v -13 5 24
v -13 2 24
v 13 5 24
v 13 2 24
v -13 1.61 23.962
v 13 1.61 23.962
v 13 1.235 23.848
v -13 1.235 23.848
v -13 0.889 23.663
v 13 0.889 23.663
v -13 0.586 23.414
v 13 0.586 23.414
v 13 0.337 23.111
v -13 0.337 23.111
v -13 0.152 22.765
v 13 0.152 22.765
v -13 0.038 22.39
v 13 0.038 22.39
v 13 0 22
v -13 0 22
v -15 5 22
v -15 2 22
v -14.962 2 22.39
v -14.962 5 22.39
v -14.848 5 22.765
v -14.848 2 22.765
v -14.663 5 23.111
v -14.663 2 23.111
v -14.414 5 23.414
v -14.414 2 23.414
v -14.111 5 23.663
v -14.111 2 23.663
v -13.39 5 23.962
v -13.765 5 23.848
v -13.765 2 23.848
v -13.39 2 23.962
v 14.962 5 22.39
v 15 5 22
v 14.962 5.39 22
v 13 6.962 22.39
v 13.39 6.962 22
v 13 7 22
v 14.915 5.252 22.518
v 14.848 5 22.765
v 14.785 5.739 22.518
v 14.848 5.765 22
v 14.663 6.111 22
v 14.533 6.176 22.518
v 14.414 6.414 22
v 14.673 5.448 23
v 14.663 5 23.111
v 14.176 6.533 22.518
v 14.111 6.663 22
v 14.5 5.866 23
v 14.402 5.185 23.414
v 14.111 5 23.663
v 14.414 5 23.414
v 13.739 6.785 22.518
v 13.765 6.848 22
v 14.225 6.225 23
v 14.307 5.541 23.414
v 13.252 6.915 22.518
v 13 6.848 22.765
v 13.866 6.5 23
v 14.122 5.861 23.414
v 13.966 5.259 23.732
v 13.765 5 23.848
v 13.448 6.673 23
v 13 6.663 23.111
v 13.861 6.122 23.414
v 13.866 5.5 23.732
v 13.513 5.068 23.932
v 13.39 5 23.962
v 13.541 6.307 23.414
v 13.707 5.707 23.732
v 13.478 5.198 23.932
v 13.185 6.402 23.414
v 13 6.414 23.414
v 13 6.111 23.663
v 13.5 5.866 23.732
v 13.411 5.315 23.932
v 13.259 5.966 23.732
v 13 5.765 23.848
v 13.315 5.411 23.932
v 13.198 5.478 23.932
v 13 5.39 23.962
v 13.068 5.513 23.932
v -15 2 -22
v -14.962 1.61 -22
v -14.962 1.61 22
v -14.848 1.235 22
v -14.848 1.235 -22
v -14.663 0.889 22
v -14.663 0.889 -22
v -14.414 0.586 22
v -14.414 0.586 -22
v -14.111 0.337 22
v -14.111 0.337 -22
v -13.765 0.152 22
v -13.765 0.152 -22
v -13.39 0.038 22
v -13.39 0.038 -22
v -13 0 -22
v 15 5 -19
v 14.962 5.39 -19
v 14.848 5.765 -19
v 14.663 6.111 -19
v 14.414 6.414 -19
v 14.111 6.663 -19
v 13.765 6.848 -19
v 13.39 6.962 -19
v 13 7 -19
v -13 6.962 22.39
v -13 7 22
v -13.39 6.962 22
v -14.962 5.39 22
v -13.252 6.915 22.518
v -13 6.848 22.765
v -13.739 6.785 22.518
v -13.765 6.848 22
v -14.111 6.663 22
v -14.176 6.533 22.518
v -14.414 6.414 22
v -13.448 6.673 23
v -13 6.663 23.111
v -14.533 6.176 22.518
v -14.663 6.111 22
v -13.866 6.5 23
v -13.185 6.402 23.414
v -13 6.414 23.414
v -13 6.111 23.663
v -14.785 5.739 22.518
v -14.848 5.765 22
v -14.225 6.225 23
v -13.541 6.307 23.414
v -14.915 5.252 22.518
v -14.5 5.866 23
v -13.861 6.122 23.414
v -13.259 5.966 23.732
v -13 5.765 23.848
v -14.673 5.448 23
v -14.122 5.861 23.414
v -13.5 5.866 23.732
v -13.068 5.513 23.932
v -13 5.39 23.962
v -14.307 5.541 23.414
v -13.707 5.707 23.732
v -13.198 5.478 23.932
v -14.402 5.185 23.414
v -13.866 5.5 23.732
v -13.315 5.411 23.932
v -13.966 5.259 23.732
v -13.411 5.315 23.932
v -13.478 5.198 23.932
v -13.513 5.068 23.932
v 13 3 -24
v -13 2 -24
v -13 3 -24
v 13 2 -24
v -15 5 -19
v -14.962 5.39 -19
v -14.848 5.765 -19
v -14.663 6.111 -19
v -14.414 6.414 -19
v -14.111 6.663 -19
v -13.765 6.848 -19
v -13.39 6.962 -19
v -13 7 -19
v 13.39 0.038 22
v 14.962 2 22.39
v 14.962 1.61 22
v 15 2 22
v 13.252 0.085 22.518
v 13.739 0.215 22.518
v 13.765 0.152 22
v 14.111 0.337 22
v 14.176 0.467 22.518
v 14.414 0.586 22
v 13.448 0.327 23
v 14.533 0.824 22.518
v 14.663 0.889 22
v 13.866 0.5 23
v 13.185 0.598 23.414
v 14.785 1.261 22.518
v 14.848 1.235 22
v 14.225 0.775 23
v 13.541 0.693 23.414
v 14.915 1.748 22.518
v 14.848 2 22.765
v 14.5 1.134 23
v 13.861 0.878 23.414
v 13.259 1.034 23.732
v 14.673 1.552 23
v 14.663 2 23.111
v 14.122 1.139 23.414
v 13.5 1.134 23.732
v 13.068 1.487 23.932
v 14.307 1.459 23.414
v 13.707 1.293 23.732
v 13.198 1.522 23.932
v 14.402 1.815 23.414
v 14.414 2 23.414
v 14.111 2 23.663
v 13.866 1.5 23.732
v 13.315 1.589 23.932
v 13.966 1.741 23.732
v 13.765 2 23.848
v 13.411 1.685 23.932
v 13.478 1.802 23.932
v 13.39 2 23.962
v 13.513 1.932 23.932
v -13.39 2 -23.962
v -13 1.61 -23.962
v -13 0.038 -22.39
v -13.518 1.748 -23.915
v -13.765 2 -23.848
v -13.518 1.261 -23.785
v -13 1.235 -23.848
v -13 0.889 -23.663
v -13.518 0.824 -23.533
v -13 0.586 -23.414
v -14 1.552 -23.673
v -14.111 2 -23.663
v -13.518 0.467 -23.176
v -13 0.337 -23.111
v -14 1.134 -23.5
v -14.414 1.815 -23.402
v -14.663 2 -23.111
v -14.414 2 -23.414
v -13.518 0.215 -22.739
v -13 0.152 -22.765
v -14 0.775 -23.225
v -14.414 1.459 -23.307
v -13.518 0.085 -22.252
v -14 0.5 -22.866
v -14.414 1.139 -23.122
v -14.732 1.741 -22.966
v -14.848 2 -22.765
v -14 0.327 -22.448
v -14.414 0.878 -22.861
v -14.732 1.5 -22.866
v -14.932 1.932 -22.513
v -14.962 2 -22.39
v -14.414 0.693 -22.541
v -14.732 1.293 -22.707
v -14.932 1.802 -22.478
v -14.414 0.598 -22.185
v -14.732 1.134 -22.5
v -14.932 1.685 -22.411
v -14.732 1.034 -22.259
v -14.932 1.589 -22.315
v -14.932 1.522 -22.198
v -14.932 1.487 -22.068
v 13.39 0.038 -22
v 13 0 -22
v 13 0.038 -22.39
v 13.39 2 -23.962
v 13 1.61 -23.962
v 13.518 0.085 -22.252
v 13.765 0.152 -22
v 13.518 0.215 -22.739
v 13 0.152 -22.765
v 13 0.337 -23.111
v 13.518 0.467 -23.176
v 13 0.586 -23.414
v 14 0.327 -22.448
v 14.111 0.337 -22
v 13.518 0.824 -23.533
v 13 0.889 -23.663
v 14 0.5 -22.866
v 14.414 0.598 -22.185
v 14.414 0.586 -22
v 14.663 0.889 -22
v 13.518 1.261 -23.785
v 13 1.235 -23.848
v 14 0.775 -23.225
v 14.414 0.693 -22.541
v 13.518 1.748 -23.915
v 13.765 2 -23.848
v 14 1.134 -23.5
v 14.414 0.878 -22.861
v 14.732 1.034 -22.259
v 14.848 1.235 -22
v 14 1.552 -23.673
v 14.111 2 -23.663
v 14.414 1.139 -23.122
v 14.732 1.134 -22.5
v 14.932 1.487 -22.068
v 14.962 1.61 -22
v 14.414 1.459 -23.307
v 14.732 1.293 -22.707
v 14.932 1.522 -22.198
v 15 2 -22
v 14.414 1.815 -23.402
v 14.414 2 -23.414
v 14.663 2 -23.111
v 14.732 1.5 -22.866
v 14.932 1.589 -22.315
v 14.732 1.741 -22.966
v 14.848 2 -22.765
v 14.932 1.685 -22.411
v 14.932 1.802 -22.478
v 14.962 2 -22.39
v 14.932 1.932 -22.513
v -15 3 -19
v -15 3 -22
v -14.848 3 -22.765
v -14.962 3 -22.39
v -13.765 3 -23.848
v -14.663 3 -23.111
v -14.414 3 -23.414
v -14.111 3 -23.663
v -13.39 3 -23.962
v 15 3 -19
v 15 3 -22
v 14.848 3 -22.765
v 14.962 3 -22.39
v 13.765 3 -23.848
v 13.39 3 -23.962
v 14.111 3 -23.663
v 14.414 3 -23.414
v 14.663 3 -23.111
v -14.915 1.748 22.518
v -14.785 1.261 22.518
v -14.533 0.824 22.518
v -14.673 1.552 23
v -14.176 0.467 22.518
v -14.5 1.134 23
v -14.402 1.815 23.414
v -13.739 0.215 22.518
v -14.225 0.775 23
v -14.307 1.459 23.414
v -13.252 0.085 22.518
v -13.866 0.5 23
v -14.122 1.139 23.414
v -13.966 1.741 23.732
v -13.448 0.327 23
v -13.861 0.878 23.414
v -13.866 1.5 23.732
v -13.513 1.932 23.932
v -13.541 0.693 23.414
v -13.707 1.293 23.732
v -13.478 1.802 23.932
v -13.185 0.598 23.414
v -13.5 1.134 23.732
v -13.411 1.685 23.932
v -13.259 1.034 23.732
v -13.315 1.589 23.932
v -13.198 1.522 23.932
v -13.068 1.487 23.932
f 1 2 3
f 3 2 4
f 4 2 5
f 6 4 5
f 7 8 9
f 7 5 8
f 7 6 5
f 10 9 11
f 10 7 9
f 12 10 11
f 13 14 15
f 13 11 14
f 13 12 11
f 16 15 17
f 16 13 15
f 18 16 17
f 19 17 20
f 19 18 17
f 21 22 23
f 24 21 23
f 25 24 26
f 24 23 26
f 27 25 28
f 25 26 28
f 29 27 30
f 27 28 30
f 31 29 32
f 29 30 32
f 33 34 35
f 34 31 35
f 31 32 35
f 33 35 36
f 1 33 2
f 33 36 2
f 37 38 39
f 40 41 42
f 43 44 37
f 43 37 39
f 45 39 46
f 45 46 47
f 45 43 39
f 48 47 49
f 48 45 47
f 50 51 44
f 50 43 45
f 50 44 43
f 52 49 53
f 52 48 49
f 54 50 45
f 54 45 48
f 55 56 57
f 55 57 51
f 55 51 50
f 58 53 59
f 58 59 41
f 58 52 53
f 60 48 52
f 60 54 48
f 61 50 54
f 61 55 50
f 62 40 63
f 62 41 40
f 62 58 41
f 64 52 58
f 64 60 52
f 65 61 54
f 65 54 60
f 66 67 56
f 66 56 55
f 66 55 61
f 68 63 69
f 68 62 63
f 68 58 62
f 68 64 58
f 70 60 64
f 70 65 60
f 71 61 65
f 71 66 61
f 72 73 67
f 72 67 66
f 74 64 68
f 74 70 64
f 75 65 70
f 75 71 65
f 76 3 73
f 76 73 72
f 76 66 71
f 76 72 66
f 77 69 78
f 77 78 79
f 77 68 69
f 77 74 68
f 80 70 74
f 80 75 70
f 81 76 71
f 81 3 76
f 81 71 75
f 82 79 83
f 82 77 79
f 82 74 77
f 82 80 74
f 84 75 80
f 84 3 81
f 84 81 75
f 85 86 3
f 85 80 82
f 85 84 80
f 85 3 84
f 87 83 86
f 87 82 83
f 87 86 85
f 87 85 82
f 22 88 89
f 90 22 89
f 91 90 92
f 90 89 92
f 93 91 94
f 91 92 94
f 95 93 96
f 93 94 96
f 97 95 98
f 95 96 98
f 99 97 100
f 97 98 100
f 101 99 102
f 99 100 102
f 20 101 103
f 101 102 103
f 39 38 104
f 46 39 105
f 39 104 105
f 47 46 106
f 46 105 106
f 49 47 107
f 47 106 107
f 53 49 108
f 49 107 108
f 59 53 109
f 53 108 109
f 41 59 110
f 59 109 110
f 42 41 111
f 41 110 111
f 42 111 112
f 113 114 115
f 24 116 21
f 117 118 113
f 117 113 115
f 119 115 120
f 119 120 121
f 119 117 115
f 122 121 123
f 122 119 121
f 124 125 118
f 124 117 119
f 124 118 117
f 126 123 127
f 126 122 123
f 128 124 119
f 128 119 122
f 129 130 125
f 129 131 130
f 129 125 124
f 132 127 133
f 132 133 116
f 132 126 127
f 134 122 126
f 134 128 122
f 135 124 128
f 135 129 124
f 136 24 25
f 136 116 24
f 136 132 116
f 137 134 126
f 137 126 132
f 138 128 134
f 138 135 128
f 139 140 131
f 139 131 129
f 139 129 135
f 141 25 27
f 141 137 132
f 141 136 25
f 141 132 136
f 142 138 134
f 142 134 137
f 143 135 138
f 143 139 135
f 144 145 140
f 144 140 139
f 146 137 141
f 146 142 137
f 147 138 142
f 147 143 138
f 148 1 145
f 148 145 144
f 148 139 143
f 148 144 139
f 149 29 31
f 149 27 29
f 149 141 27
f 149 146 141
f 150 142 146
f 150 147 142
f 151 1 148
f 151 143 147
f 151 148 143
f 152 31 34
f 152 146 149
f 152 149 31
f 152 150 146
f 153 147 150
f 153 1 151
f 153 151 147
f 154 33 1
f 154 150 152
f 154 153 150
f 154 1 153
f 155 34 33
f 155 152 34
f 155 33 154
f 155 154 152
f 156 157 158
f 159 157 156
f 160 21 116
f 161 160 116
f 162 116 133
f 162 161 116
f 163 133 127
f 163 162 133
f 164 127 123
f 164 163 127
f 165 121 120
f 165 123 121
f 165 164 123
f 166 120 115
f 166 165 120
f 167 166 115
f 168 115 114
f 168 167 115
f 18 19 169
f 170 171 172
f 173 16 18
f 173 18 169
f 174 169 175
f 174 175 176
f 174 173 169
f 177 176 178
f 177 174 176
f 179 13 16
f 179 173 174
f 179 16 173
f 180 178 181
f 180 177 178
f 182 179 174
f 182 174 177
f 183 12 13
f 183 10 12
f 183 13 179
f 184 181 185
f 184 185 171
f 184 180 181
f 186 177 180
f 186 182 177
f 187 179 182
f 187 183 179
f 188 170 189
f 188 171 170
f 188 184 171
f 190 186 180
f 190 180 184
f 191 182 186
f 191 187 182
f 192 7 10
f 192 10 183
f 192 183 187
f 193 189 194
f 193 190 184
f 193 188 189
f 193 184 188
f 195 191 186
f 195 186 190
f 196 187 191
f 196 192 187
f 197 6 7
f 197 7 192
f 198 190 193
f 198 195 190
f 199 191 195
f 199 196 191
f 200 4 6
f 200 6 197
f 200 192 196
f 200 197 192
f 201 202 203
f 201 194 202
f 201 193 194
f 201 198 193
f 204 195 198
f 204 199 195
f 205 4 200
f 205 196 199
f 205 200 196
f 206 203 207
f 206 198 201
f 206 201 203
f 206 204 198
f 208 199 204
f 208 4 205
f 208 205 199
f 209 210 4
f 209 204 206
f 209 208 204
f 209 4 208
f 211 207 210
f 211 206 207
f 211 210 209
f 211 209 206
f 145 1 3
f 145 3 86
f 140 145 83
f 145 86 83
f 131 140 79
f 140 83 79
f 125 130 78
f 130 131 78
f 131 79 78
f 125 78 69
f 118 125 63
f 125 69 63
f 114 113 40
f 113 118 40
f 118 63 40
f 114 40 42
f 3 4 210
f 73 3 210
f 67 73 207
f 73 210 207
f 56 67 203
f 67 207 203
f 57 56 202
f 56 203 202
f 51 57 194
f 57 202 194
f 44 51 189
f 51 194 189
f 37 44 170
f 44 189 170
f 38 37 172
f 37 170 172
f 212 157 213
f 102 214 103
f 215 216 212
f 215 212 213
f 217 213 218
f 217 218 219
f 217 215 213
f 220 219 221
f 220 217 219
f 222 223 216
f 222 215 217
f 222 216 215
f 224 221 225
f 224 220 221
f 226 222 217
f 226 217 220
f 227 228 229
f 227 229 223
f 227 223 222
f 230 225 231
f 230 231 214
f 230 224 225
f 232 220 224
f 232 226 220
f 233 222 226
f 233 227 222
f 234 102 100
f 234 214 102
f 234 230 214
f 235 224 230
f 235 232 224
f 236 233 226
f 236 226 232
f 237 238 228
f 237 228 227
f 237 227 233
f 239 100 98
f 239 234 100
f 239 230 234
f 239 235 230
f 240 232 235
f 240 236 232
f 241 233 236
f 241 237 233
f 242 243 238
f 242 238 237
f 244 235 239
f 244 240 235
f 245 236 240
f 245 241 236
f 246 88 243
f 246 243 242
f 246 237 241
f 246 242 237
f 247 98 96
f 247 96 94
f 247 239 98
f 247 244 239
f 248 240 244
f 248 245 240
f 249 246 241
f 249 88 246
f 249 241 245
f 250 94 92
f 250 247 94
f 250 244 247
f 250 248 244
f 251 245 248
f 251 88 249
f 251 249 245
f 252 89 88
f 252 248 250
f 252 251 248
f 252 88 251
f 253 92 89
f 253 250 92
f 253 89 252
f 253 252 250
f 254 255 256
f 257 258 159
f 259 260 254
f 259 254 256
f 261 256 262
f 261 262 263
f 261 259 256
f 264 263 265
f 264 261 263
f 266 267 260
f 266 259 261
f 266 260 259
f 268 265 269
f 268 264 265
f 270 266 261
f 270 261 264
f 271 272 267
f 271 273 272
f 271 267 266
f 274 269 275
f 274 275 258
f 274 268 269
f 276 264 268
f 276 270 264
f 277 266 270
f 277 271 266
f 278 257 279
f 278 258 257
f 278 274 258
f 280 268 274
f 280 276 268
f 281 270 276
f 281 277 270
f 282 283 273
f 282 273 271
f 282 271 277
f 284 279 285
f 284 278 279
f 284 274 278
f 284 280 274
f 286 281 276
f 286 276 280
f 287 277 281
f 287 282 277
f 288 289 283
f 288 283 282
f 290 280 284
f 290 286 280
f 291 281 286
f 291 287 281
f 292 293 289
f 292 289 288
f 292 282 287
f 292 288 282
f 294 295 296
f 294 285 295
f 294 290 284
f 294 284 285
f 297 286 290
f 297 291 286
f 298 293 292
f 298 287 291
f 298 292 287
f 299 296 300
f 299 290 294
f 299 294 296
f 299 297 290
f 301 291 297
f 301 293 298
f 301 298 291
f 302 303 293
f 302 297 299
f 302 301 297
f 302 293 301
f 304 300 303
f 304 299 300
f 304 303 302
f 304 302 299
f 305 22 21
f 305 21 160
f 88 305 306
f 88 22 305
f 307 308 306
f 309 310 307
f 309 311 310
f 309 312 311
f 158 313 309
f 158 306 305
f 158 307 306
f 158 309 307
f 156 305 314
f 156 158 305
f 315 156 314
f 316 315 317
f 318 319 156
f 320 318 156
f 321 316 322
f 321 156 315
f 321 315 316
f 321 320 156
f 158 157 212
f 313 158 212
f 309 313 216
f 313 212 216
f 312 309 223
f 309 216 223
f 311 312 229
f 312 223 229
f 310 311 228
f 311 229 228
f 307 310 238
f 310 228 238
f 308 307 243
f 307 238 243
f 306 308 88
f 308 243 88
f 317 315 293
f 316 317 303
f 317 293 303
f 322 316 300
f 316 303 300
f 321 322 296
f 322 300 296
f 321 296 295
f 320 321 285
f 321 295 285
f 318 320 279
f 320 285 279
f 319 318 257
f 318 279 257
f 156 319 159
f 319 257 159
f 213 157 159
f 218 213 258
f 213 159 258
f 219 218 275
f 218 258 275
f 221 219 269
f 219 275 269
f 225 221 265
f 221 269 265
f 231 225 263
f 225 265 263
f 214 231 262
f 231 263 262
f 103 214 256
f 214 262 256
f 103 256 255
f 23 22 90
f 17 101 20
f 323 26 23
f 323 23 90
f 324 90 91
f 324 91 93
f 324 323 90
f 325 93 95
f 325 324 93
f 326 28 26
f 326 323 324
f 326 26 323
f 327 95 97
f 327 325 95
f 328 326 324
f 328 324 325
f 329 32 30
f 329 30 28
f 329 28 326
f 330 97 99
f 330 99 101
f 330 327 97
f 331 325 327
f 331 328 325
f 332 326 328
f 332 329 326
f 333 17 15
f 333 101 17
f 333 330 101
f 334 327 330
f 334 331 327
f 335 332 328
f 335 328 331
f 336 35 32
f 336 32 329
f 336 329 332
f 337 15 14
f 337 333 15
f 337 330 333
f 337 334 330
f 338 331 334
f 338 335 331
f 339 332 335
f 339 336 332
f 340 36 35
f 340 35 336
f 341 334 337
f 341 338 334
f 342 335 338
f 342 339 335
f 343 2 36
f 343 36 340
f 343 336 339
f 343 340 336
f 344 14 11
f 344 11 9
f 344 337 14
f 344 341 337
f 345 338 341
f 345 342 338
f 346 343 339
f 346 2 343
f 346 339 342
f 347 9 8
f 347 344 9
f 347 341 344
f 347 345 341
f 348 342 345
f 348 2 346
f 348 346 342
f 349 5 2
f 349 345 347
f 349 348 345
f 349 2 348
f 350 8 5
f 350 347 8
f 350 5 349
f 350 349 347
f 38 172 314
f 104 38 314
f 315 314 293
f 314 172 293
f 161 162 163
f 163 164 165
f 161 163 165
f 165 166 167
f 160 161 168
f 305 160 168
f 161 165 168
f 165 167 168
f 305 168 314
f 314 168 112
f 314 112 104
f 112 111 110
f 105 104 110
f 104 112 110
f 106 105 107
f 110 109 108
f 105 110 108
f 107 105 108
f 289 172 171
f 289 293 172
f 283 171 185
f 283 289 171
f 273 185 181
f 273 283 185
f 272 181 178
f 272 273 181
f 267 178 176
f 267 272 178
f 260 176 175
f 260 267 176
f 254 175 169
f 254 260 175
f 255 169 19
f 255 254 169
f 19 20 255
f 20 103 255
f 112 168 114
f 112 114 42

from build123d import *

# Parameters (mm, degrees)
SKETCH_1_W          = 30
SKETCH_1_H          = 48
EXTRUDE_1_DEPTH     = 7
FILLET_1_R          = 2
FILLET_2_R          = 2
SKETCH_2_W          = 26
SKETCH_2_H          = 3
CUT_EXTRUDE_1_DEPTH = 4


with BuildPart() as part:
    # Эскиз1 → Бобышка-Вытянуть1 (new body)
    with BuildSketch(Plane(origin=(0, 0, 0), x_dir=(1, 0, 0), z_dir=(0, 1, 0))):
        Rectangle(SKETCH_1_W, SKETCH_1_H)
    extrude(amount=EXTRUDE_1_DEPTH)

    # Скругление1
    fillet_1_edges = [part.edges().sort_by_distance(p)[0] for p in [
        (-15, 7, 0),
        (0, 7, 24),
        (15, 7, 0),
        (0, 0, 24),
        (-15, 0, 0),
        (0, 0, -24),
        (15, 0, 0),
        (0, 7, -24),
    ]]
    fillet(fillet_1_edges, radius=FILLET_1_R)

    # Скругление2
    # the kernel refuses this fillet: 2 mm, written as the material it takes off along each edge
    with BuildSketch(Plane(origin=(13, 2, 22), x_dir=(1, 0, 0), z_dir=(0, 0, 1))) as fillet_2_piece_1_section:
        Polygon((0, 0), (FILLET_2_R, 0), (FILLET_2_R, -FILLET_2_R), (0, -FILLET_2_R), align=None)
    fillet_2_piece_1 = extrude(amount=FILLET_2_R, mode=Mode.PRIVATE)
    fillet_2_piece_1 = fillet_2_piece_1 - Plane(origin=(13, 2, 22), x_dir=(-0.7071067811865475, 0.7071067811865475, 0), z_dir=(0, 0, 1)) * Sphere(FILLET_2_R, mode=Mode.PRIVATE)
    add(fillet_2_piece_1, mode=Mode.SUBTRACT)
    with BuildSketch(Plane(origin=(-13, 2, 22), x_dir=(-1, 0, 0), z_dir=(0, 0, 1))) as fillet_2_piece_2_section:
        Polygon((0, 0), (FILLET_2_R, 0), (FILLET_2_R, FILLET_2_R), (0, FILLET_2_R), align=None)
    fillet_2_piece_2 = extrude(amount=FILLET_2_R, mode=Mode.PRIVATE)
    fillet_2_piece_2 = fillet_2_piece_2 - Plane(origin=(-13, 2, 22), x_dir=(0.7071067811865475, 0.7071067811865475, 0), z_dir=(0, 0, 1)) * Sphere(FILLET_2_R, mode=Mode.PRIVATE)
    add(fillet_2_piece_2, mode=Mode.SUBTRACT)
    with BuildSketch(Plane(origin=(13, 2, -22), x_dir=(0, 0, -1), z_dir=(1, 0, 0))) as fillet_2_piece_3_section:
        Polygon((0, 0), (FILLET_2_R, 0), (FILLET_2_R, -FILLET_2_R), (0, -FILLET_2_R), align=None)
    fillet_2_piece_3 = extrude(amount=FILLET_2_R, mode=Mode.PRIVATE)
    fillet_2_piece_3 = fillet_2_piece_3 - Plane(origin=(13, 2, -22), x_dir=(0, 0.7071067811865475, 0.7071067811865475), z_dir=(1, 0, 0)) * Sphere(FILLET_2_R, mode=Mode.PRIVATE)
    add(fillet_2_piece_3, mode=Mode.SUBTRACT)
    with BuildSketch(Plane(origin=(-13, 2, -22), x_dir=(0, 0, -1), z_dir=(-1, 0, 0))) as fillet_2_piece_4_section:
        Polygon((0, 0), (FILLET_2_R, 0), (FILLET_2_R, FILLET_2_R), (0, FILLET_2_R), align=None)
    fillet_2_piece_4 = extrude(amount=FILLET_2_R, mode=Mode.PRIVATE)
    fillet_2_piece_4 = fillet_2_piece_4 - Plane(origin=(-13, 2, -22), x_dir=(0, 0.7071067811865475, 0.7071067811865475), z_dir=(-1, 0, 0)) * Sphere(FILLET_2_R, mode=Mode.PRIVATE)
    add(fillet_2_piece_4, mode=Mode.SUBTRACT)
    with BuildSketch(Plane(origin=(-13, 5, -22), x_dir=(0, 0, -1), z_dir=(-1, 0, 0))) as fillet_2_piece_5_section:
        Polygon((0, 0), (FILLET_2_R, 0), (FILLET_2_R, -FILLET_2_R), (0, -FILLET_2_R), align=None)
    fillet_2_piece_5 = extrude(amount=FILLET_2_R, mode=Mode.PRIVATE)
    fillet_2_piece_5 = fillet_2_piece_5 - Plane(origin=(-13, 5, -22), x_dir=(0, -0.7071067811865475, 0.7071067811865475), z_dir=(-1, 0, 0)) * Sphere(FILLET_2_R, mode=Mode.PRIVATE)
    add(fillet_2_piece_5, mode=Mode.SUBTRACT)
    with BuildSketch(Plane(origin=(13, 5, -22), x_dir=(0, 0, -1), z_dir=(1, 0, 0))) as fillet_2_piece_6_section:
        Polygon((0, 0), (FILLET_2_R, 0), (FILLET_2_R, FILLET_2_R), (0, FILLET_2_R), align=None)
    fillet_2_piece_6 = extrude(amount=FILLET_2_R, mode=Mode.PRIVATE)
    fillet_2_piece_6 = fillet_2_piece_6 - Plane(origin=(13, 5, -22), x_dir=(0, -0.7071067811865475, 0.7071067811865475), z_dir=(1, 0, 0)) * Sphere(FILLET_2_R, mode=Mode.PRIVATE)
    add(fillet_2_piece_6, mode=Mode.SUBTRACT)
    with BuildSketch(Plane(origin=(-13, 5, 22), x_dir=(-1, 0, 0), z_dir=(0, 0, 1))) as fillet_2_piece_7_section:
        Polygon((0, 0), (FILLET_2_R, 0), (FILLET_2_R, -FILLET_2_R), (0, -FILLET_2_R), align=None)
    fillet_2_piece_7 = extrude(amount=FILLET_2_R, mode=Mode.PRIVATE)
    fillet_2_piece_7 = fillet_2_piece_7 - Plane(origin=(-13, 5, 22), x_dir=(0.7071067811865475, -0.7071067811865475, 0), z_dir=(0, 0, 1)) * Sphere(FILLET_2_R, mode=Mode.PRIVATE)
    add(fillet_2_piece_7, mode=Mode.SUBTRACT)
    with BuildSketch(Plane(origin=(13, 5, 22), x_dir=(1, 0, 0), z_dir=(0, 0, 1))) as fillet_2_piece_8_section:
        Polygon((0, 0), (FILLET_2_R, 0), (FILLET_2_R, FILLET_2_R), (0, FILLET_2_R), align=None)
    fillet_2_piece_8 = extrude(amount=FILLET_2_R, mode=Mode.PRIVATE)
    fillet_2_piece_8 = fillet_2_piece_8 - Plane(origin=(13, 5, 22), x_dir=(-0.7071067811865475, -0.7071067811865475, 0), z_dir=(0, 0, 1)) * Sphere(FILLET_2_R, mode=Mode.PRIVATE)
    add(fillet_2_piece_8, mode=Mode.SUBTRACT)
    with BuildSketch(Plane(origin=(-15, 2, -24), x_dir=(0, 0, 1), z_dir=(0, 1, 0)), Plane(origin=(-15, 2, 24), x_dir=(1, 0, 0), z_dir=(0, 1, 0))) as fillet_2_piece_9:
        with BuildLine():
            CenterArc((FILLET_2_R, FILLET_2_R), FILLET_2_R, 180, 90)
            Line((0, FILLET_2_R), (0, 0))
            Line((0, 0), (FILLET_2_R, 0))
        make_face()
    extrude(amount=3, mode=Mode.SUBTRACT)
    with BuildSketch(Plane(origin=(15, 2, -24), x_dir=(0, 0, 1), z_dir=(0, 1, 0)), Plane(origin=(15, 2, 24), x_dir=(-1, 0, 0), z_dir=(0, 1, 0))) as fillet_2_piece_10:
        with BuildLine():
            CenterArc((FILLET_2_R, -FILLET_2_R), FILLET_2_R, 90, 90)
            Line((0, -FILLET_2_R), (0, 0))
            Line((0, 0), (FILLET_2_R, 0))
        make_face()
    extrude(amount=3, mode=Mode.SUBTRACT)

    # Эскиз2 → Вырез-Вытянуть1 (cut)
    with BuildSketch(Plane(origin=(0, 7, 0), x_dir=(1, 0, 0), z_dir=(0, 1, 0))):
        with Locations((0, 20.5)):
            Rectangle(SKETCH_2_W, SKETCH_2_H)
        Polygon((-13, 24), (-15.574798144, 24), (-15.574798144, 19), (-13, 19), (-13, 22), (13, 22), (13, 19), (18.278986273, 19), (18.278986273, 24), (13, 24), align=None)
    extrude(amount=-CUT_EXTRUDE_1_DEPTH, mode=Mode.SUBTRACT)


solid = part.part
